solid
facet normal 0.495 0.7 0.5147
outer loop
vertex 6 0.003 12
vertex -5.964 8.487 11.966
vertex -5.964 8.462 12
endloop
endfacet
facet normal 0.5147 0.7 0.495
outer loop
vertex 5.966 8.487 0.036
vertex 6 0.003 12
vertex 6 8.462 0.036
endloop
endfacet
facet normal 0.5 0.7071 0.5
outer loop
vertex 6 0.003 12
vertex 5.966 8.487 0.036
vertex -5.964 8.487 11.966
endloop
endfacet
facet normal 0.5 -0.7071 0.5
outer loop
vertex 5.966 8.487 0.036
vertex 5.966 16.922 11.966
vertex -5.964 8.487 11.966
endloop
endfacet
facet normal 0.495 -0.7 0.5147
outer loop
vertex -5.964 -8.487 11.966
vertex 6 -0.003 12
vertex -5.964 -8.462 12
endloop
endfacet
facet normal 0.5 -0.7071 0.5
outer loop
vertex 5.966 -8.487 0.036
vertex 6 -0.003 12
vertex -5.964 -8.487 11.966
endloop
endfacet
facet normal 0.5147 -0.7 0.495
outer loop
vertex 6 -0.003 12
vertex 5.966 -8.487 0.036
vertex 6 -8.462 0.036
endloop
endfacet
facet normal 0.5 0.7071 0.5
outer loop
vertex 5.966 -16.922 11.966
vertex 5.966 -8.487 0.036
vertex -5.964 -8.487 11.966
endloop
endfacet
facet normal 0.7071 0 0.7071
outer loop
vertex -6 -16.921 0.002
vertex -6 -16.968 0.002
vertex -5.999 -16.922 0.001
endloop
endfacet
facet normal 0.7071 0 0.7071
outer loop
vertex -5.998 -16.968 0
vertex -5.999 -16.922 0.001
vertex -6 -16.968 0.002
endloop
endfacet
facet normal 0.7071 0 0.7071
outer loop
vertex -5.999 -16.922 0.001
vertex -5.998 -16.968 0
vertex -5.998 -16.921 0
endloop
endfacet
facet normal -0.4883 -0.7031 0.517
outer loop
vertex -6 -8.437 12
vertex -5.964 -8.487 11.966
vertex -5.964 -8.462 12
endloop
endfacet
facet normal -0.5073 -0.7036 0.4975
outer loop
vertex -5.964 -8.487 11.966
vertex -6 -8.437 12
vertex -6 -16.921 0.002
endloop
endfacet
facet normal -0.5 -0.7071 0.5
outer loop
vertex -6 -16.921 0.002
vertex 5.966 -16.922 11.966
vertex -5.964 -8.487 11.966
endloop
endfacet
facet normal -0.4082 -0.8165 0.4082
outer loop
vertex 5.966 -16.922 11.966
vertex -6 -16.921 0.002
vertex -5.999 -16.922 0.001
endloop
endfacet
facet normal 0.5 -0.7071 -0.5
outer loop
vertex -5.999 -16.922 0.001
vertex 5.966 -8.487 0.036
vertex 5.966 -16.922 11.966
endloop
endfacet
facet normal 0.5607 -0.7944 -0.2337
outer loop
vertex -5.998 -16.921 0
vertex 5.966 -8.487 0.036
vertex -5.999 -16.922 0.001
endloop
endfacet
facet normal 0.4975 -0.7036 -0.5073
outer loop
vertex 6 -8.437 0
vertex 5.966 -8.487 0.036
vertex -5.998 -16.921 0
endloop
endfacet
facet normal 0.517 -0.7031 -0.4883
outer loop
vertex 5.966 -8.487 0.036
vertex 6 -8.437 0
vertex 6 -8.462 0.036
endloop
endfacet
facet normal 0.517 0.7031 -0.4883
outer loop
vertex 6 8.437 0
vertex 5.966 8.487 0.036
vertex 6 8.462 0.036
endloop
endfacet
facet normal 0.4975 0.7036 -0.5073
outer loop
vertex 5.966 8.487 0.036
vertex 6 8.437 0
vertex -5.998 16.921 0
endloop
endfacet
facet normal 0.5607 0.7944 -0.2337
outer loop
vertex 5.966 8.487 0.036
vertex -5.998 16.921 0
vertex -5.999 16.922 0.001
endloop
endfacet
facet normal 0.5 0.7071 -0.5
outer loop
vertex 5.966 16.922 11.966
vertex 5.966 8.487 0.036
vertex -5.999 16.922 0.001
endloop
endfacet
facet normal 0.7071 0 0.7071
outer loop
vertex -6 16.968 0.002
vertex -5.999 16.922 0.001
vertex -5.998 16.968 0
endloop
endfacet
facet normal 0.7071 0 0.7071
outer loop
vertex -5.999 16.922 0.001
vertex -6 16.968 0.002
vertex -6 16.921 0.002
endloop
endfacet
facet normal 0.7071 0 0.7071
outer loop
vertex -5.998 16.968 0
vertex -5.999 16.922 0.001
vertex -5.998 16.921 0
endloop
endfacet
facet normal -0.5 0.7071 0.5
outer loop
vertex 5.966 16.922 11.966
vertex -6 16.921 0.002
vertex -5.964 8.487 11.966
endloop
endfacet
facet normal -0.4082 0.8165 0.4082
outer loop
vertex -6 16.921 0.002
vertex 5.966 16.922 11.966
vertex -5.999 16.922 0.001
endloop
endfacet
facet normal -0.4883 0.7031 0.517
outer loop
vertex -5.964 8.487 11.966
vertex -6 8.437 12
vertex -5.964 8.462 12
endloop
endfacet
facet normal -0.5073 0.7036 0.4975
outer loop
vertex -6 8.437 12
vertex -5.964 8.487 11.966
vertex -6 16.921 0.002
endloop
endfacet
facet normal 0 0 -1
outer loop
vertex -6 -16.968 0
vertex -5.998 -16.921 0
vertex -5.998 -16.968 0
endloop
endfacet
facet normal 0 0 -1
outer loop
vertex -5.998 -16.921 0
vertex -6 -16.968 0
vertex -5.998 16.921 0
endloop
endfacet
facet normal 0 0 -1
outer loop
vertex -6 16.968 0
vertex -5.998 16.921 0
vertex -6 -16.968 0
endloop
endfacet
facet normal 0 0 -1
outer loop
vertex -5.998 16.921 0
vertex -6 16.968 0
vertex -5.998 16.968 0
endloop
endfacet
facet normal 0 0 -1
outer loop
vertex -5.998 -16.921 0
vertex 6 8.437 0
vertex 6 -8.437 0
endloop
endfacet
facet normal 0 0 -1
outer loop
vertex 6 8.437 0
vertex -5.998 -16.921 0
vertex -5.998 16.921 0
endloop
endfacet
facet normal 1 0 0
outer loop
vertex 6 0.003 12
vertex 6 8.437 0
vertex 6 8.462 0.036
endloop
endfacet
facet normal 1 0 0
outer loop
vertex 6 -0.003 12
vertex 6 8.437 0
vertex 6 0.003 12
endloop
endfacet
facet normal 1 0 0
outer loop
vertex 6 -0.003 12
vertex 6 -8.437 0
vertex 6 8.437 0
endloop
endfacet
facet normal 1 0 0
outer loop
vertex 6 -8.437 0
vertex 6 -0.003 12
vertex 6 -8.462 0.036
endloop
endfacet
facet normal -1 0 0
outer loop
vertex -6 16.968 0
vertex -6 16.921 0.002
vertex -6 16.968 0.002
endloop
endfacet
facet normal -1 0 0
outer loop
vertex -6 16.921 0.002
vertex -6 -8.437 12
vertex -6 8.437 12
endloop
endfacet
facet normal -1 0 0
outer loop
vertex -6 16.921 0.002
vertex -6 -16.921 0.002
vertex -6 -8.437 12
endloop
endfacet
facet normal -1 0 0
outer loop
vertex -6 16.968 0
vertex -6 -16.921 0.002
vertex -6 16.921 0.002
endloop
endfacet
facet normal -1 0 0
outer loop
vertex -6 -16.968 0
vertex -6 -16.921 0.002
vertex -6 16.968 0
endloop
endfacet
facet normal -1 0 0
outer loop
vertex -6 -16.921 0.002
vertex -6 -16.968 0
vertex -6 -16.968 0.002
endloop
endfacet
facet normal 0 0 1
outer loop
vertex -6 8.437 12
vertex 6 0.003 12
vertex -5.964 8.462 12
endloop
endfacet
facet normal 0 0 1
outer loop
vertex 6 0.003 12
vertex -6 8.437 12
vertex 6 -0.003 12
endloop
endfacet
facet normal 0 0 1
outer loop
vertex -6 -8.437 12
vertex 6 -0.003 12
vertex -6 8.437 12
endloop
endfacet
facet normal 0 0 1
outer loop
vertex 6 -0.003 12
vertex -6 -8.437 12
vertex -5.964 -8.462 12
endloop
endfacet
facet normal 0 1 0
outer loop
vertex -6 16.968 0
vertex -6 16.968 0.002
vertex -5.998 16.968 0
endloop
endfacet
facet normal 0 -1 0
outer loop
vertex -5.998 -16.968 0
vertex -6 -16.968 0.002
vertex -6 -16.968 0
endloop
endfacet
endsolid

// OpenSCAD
//12_point.scad

side=12;

translate([0,0,side/2])
rotate([0,45,0])

difference()
{
	rotate([0,45,0])
	cube([side, side*2*1.414, side], center=true);

	union()
	{
		translate([0,side/1.414,side/1.414])
		rotate([0,45,90])
		cube([side, side*2*1.414, side], center=true);
		translate([0,-side/1.414,side/1.414])
		rotate([0,45,90])
		cube([side, side*2*1.414, side], center=true);

		translate([0,-side*2*1.205,0])
		rotate([0,0,45])
		cube([side*1.414, side*2*2, side*1.414], center=true);
		translate([0,-side*2*1.205,0])
		rotate([0,0,-45])
		cube([side*1.414, side*2*2, side*1.414], center=true);

		translate([0,side*2*1.205,0])
		rotate([0,0,45])
		cube([side*1.414, side*2*2, side*1.414], center=true);
		translate([0,side*2*1.205,0])
		rotate([0,0,-45])
		cube([side*1.414, side*2*2, side*1.414], center=true);

	}
}
